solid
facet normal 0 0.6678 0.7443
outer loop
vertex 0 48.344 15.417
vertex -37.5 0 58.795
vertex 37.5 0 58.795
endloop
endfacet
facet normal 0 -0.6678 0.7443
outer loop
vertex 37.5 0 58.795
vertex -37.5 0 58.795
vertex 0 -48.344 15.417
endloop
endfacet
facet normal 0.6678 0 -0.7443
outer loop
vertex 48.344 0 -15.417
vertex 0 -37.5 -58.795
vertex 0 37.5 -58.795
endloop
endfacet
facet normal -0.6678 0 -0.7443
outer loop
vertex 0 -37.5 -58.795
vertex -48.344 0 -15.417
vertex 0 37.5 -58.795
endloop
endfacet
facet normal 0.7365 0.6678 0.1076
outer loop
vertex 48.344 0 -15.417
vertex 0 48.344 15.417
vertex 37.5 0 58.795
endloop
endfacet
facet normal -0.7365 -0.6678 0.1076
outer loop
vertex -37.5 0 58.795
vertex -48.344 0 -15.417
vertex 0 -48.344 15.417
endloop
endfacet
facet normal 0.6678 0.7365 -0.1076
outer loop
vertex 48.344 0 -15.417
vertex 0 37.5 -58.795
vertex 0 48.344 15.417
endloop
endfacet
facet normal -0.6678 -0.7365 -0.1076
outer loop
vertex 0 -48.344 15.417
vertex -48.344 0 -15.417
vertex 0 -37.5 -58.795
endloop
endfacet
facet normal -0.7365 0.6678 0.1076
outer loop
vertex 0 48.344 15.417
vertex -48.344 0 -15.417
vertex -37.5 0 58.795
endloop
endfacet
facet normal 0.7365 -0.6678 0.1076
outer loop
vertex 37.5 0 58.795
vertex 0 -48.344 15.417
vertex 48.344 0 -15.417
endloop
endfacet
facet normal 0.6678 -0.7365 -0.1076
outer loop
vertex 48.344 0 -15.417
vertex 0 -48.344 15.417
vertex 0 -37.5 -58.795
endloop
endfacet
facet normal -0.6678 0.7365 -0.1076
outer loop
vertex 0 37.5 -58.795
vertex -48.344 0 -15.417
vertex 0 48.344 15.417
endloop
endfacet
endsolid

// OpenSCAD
// file: numbers.scad
// The number we all love.
gold = (1 + sqrt(5)) / 2;

// Ratio of inner over outer circumscribed radii of the icosahedron.  The
// dodecahedron has the same ratio!
inscribe = sqrt(1/3 + 2/15 * sqrt(5));
// Ratio of face radius to icosahedron radius.
coscribe = sqrt(2/3 - 2/15 * sqrt(5));
// Ratio of dodecahedral mid-edge to vertex radii.  (This is the cosine of half
// the dihedral angle).
dodeca_midscribe = sqrt(1/2 + sqrt(5) / 6);
dodeca_comidscribe = sqrt(1/2 - sqrt(5) / 6);
// Ratio of icosahedral mid-edge to vertex radii.  (This is the cosine of half
// the dihedral angle).
icosa_midscribe = sqrt(1/2 + sqrt(5) / 10);
icosa_comidscribe = sqrt(1/2 - sqrt(5) / 10);

// Relative radii of the icosohedral stellation points.
raw_radius1 = 1;
raw_radius2 = (6 * gold - 3) / 5 * inscribe; // 1.0661408512011674
raw_radius3 = gold * icosa_midscribe;        // 1.3763819204711734
raw_radius4 = sqrt((17 - 4 * gold) / 5);     // 1.451059202444919
raw_radius5 = sqrt(21 + 28 * gold) / 5;      // 1.6285570507046667
raw_radius6 = 3 * inscribe;                  // 2.3839634168752983
raw_radius7 = 1 + 2 * gold;                  // 4.23607
raw_radius8 = sqrt(97 / 5 + 156 / 5 * gold); // 8.359584944780256
assert(abs(raw_radius5 - 1.6285570507046667) < 1e-7);
assert(abs(raw_radius8 - 8.359584944780256) < 1e-7);

// Radius of icosahedron with the vertex definitions we use.
ico_scale = sqrt(2 + gold);
// Actual radii in openscad units of the icosahedral stellation points.
radius1 = ico_scale;
radius2 = raw_radius2 * ico_scale;
radius3 = raw_radius3 * ico_scale;
radius4 = raw_radius4 * ico_scale;
radius5 = raw_radius5 * ico_scale;
radius6 = raw_radius6 * ico_scale;
radius7 = raw_radius7 * ico_scale;
radius8 = raw_radius8 * ico_scale;

identity = [[1,0,0],[0,1,0],[0,0,1]];

// Clockwise around [1,0,gold].
rot5 = [[1/2, gold/2, 1/2/gold],
        [-gold/2, 1/2/gold, 1/2],
        [1/2/gold, -1/2, gold/2]];

rot5_2 = rot5 * rot5;
rot5_3 = rot5_2 * rot5;
rot5_4 = rot5_2 * rot5_2;

rotate5 = [identity, rot5, rot5_2, rot5_3, rot5_4];
// file: stand.scad
// STANDS

// Create a tripod.  This implies that the object is face-up to get the 3-fold
// symmetry about the z-axis.
//
// `strut` is the distance from the z-axis to the support struts, as a fraction
// of radius.  `strut_mm` is the same in mm.  If both are non-zero then they
// are added together.
//
// `length` is the length of the strut, as fraction of radius.  Note that as
// the object is raised 2mm, we also increase the length by 2mm.
//
// `thick` is the radius of the struts.
//
// `base` is the base radius, if larger than the computed one.
//
// `hole` if non-zero is the radius of a circle to remove from the center of the
// base.
//
// `height` is the height of the center of the object, as a ratio of `radius`.
// 2mm is added to this.
module stand_tripod(strut, strut_mm=0, base=0,
                    length=1, height=1, align=[1, 0, 0], hole=0, p=10) {
    stand_generic(
        3, strut, strut_mm, base, length, height, hole, p)
        align_rot(align) faceup() children();
}

module stand_pentapod(strut, strut_mm=0, base=0,
                      length=1, height=1, hole=0, p=10) {
    stand_generic(
        5, strut, strut_mm, base, length, height, hole, p)
        pointup() children();
}

module stand_generic(num, strut, strut_mm=0, base=0,
                     length=1, height=1, hole=0, p=10) {
    if ($piece == p) {
        strut_all = strut * $radius + strut_mm;
        difference() {
            for (i = [1:num]) {
                rotate(i * 360 / num) translate([strut_all, 0, 0])
                    cylinder(r = $stand_diameter / 2, h=$radius * length + 2);
            }
            # translate([0, 0, $radius * height + 2])
                scale($radius) children();
        }
        stand_ring(base, hole, strut_all);
    }
}

module stand_quad(x, y, length=1, height=1, hole=0, knob=false) {
    difference() {
        for (c = [[x, y], [-x, y], [-x, -y], [x, -y]]) {
            translate([c.x * $radius, c.y * $radius, 0])
                cylinder(r = $stand_diameter / 2, h=$radius * length + 2);
        }
        #translate([0, 0, $radius * height + 2])
        scale($radius) children();
    }
    stand_ring(0, 1, norm([x, y]) * $radius);
}

module stand_rhombus(x, y, length=1, height=1) {
    difference() {
        for (c = [[x, 0], [-x, 0], [0, -y], [0, y]])
            translate([c.x * $radius, c.y * $radius, 0])
                cylinder(r = $stand_diameter / 2, h=$radius * length + 2);
        #translate([0, 0, $radius * height + 2])
        scale($radius) children();
    }
    stand_ring(max(x, y), min(x, y), x * $radius);
}

module stand_ring(base, hole, strut_mm) {
    outer = max(base * $radius, abs(strut_mm)) + $stand_diameter / 2;
    inner = min(hole * $radius, abs(strut_mm)) - $stand_diameter / 2;
    rounded_ring(outer, inner, n = $fn * 6);
}

module rounded_ring(outer, inner, height=0, r=2, n=0) {
    rotate_extrude($fn = n ? n : $fn) {
        translate([outer, height]) intersection() {
            circle(r);
            square(r);
        }
        if (inner >= r) translate([inner, height]) intersection() {
                circle(r);
                translate([-r, 0]) square(r);
            }
        if (outer > inner)
            translate([inner, 0]) square([outer - inner, height + r]);
        iinner = inner >= r ? inner - r : inner;
        if (height > 0)
            translate([inner, 0]) square([outer + r - iinner, height]);
    }
}
// main file
use <functions.scad>
use <splitting.scad>
use <stand.scad>

// Number of the Johnson solid.
deltahedron = 84;

// Piece to generate, 1 for main object, 2 onwards for faces, 10 for stand.
$piece = 1;

// Edge length.
$radius = 75;

// Diameter of the joiner post holes.
$join_diameter = 2.1;
// Depth of the joiner post holes.
$join_depth = 5.001;

$fn=20;

if (deltahedron == 12)
    triangular_bipyramid();

if (deltahedron == 13)
    pentagonal_bipyramid();

if (deltahedron == 17)
    gyroelongated_square_bipyramid();

if (deltahedron == 51)
    triaugmented_triangular_prism();

if (deltahedron == 84)
    snub_disphenoid();

module triangular_bipyramid() {
    id = [[1, 0, 0], [0, 1, 0], [0, 0, 1]];
    rot3 = [[-1/2, -sqrt(3)/2, 0], [sqrt(3)/2, -1/2, 0], [0, 0, 1]];
    rot3_2 = transpose(rot3.x, rot3.y, rot3.z);
    johnson_bipyramid([id, rot3, rot3_2]);
}

module pentagonal_bipyramid() {
    c72 = -(1 - sqrt(5)) / 4;
    s72 = sqrt((5 + sqrt(5)) / 8);
    c144 = -(1 + sqrt(5)) / 4;
    s144 = sqrt((5 - sqrt(5)) / 8);
    johnson_bipyramid(
        [[[1,0,0], [0,1,0], [0,0,1]],
         [[c72, -s72, 0], [s72, c72, 0], [0, 0, 1]],
         [[c144, -s144, 0], [s144, c144, 0], [0, 0, 1]],
         [[c144, s144, 0], [-s144, c144, 0], [0, 0, 1]],
         [[c72, s72, 0], [-s72, c72, 0], [0, 0, 1]]]);
}

module johnson_bipyramid(matrices) {
    n = len(matrices);
    p = matrices[0] * [1, 0, 0];
    q = matrices[1] * [1, 0, 0];
    il = norm(p - q);
    r = [$radius / il, 0, 0];
    h = $radius * sqrt(1 - 1 / (il * il));
    module half() {
        polyhedron(
            [[0, 0, h], for (m = matrices) m * r],
            [[each [1:n]], for (i = [1:n]) [0, i%n + 1, i]]);
    }
    if ($piece == 1) {
        color("lightgrey") half();
        color("grey") multmatrix([[1, 0, 0], [0, -1, 0], [0, 0, -1]]) half();
    }
    if ($piece == 2) {
        ir = [14 * r.x / h, 0, 0];
        difference() {
            half();
            for (m = matrices) translate(m * (r - ir)) joiner_post();
        }
    }
    if ($piece == 10) {
        fn = 40;
        o_rad=$radius/4;
        i_rad=4;
        // Centre of the supporting arcs.
        arc_c = [i_rad + o_rad, 0, o_rad];
        // End of arc.
        arc_e = arc_c + o_rad/2 * [-1, 0, sqrt(3)];
        // This is the point we want an edge to go through...
        pp = arc_c + [-o_rad * h, 0, o_rad * r.x] / norm([h, r.x]);
        // Translate back to centerline...
        qq = [0, 0, pp.z - h / r.x * pp.x];
        // Length of bridge at top.
        bridge = 5;
        difference() {
            intersection () {
                for (m = matrices)
                    multmatrix(m) {
                        translate(arc_c) {
                            rotate([90, 0, 0])
                                rotate_extrude(/*angle=150,*/ $fn = fn * 4)
                                translate([o_rad, 0])
                                circle(i_rad, $fn = fn);
                            //translate([i_rad+o_rad, 0, 0]) sphere(i_rad, $fn = fn);
                            //translate(arc_e) sphere(i_rad, $fn = fn);
                            translate([0, 0, sqrt(o_rad * o_rad - bridge * bridge/4)])
                                rotate([0, 90, 0])
                                cylinder(h=bridge, r=i_rad, center=true, $fn=fn);
                        }
                    }
                translate([0, 0, $radius]) cube($radius*2, center=true);
            }
            cylinder(r=2, h=$radius, $fn=n);
            translate(qq + [0, 0, h])
                multmatrix([[1, 0, 0], [0, -1, 0], [0, 0, -1]]) half();
        }
        rounded_ring(outer=o_rad+i_rad, inner=o_rad*0.75, n=fn*4);
    }
}

module gyroelongated_square_bipyramid() {
    // One square has vertices at [0.5,0.5,0] & 90° rotations, the other at
    // 45° rotations of that.
    //
    // We want the height to give a lenth of one between those...
    // h² + ½² + (½ - sqrt(½))² = 1.
    // h² + ¼ + ¼ + ½ - sqrt(½) = 1
    // h = sqrt(sqrt(½))
    h_by_2 = $radius * 0.5 * sqrt(sqrt(0.5));
    // The pyramid height has:
    // v² + ½ = 1,
    // v = sqrt(½).
    top_z = h_by_2 + $radius * sqrt(0.5);
    top = [0, 0, top_z];
    upper = [$radius / 2, $radius / 2, h_by_2];
    lower = [0, $radius * sqrt(0.5), -h_by_2];
    bot = [0, 0, -top_z];
    rot90 = [[0, -1, 0], [1, 0, 0], [0, 0, 1]];

    main();

    if ($piece == 9)
        posts();

    if ($piece == 10)
        stand();

    module main($piece = $piece) {
        part(top, rot90 * upper, upper, "gold", 2);
        part(upper, rot90 * upper, lower, "magenta", 3);
    }

    module part(u, v, w, topcolor, p) {
        if ($piece == 1)
            zeight() pyramid([u, v, w], topcolor=topcolor);
        if ($piece == p)
            delta_unpost(u, v, w, topcolor) posts();
    }

    module zfour() {
        children();
        multmatrix(rot90) children();
        multmatrix(rot90*rot90) children();
        multmatrix(rot90*rot90*rot90) children();
    }
    module rotmir() {
        children();
        sqh = sqrt(0.5);
        multmatrix([[sqh, sqh, 0], [sqh, -sqh, 0], [0, 0, -1]]) children();
    }
    module zeight() rotmir() zfour() children();

    module posts() {
        zeight() {
            edge_joiner_post(top, upper, 14.5, -5.5);
            edge_joiner_post(top, upper, -10, -5.5);

            color("red") edge_joiner_post(rot90*upper, upper, 10, -4.5);
            color("blue") edge_joiner_post(rot90*upper, upper, -12, -7.7);

            color("green") edge_joiner_post(upper, lower, 10, -4.5);
            color("orange") edge_joiner_post(rot90*upper, lower, 10, -7.7);
        }
    }

    module stand() {
        //$fn = 5;
        sradius = $radius / 2;
        sheight = sradius * sqrt(0.75);
        mradius = 5; // $radius / 10;

        // Each post has radius sradius and meets a 45° edge, so it is
        // centered at sqrt(2) * sradius.
        origin = sqrt(2) * sradius;
        difference() {
            for (angle = [-90, 0, 90, 180]) {
                rotate(angle) {
                    translate([-origin, 0, 2]) {
                        rotate([90, 0, 0])
                            rotate_extrude(angle=60, $fn = $fn * 10)
                                translate([sradius, 0]) circle(mradius);
                        translate([sradius/2, 0, sheight])
                            sphere(mradius, $fn=$fn*4);
                    }
                    if (false)
                        rotate([90, 0, 0]) linear_extrude(height = 1, center=true)
                            polygon(
                                [
                                    [origin-sradius, 0],
                                    [origin-sradius+mradius, 0],
                                    [origin-sradius/2+mradius, sheight+2],
                                    [origin-sradius, sheight+2]],
                                [[0, 1, 2, 3]]);
                }
            }
            translate([0, 0, top_z + 2]) main($piece = 1);
        }
        intersection() {
            rotate_extrude($fn = $fn * 6) {
                hole = 6;
                translate([hole, 0]) circle(2);
                translate([$radius/2, 0]) circle(2);
                translate([hole, -2]) square([$radius/2 - hole, 4]);
            }
            translate([0, 0, 1]) cube([$radius*1.5, $radius*1.5, 2], center=true);
        }
    }
}

module triaugmented_triangular_prism() {
    rot3 = [[-0.5, sqrt(0.75), 0], [-sqrt(0.75), -0.5, 0], [0, 0, 1]];
    rot3_2 = transpose(rot3.x, rot3.y, rot3.z);
    rot2 = [[1, 0, 0], [0, -1, 0], [0, 0, -1]];

    p = [$radius/sqrt(3), 0, $radius/2];
    q = rot3 * p;
    r = rot3_2 * p;
    t = [-$radius * (sqrt(1/12) + sqrt(1/2)), 0, 0];
    assert(norm(p - q) > $radius * 0.99999);
    assert(norm(p - q) < $radius * 1.00001);
    assert(norm(r - q) > $radius * 0.99999);
    assert(norm(r - q) < $radius * 1.00001);
    assert(norm(t - q) > $radius * 0.99999);
    assert(norm(t - q) < $radius * 1.00001);

    main();

    module main() {
        part(p, q, r, "gold", 2);
        part(r, q, t, "lightblue", 3);
        part(q, [q.x, q.y, -q.z], t, "magenta", 4);
    }

    if ($piece == 1 || $piece == 9)
        posts();

    if ($piece == 10)
        stand();

    module part(u, v, w, topcolor, p) {
        if ($piece == 1 && p != 2)
            six() pyramid([u, v, w], topcolor=topcolor);

        if ($piece == 1 && p == 2)
            two() pyramid([u, v, w], topcolor=topcolor);

        if ($piece == p)
            delta_unpost(u, v, w, topcolor) posts();
    }

    module two() {
        children();
        multmatrix(rot2) children();
    }
    module three() {
        children();
        multmatrix(rot3) children();
        multmatrix(rot3_2) children();
    }
    module six() three() two() children();

    module posts() {
        six() {
            color("orange") edge_joiner_post(q, r, 14, -5);
            color("yellow") edge_joiner_post(q, r, -14, -5);

            color("red") edge_joiner_post(p, rot2 * p, 10, -4);

            color("green") edge_joiner_post(t, q, 14.5, -5.5);
            color("blue") edge_joiner_post(t, r, 14.5, -5.5);

            color("lightgreen") edge_joiner_post(t, q, -11.3, -5.5);
            color("lightblue") edge_joiner_post(t, r, -11.3, -5.5);
        }
    }

    module stand() {
        $fn = 60;
        h = 20;
        r = 5;
        rad = $radius / sqrt(3);
        rounded_ring(rad + r, rad - r, n = 100);
        difference() {
            for (i = [0, 120, -120]) {
                rotate(i) {
                    translate([rad, 0, 0]) cylinder(h=h, r=r);
                    translate([rad, 0, h]) sphere(r);
                }
            }
            translate([0, 0, h + $radius / 2]) { $piece = 1; main(); }
        }
    }
}

module snub_disphenoid() {
    // This object isn't a cow so arbitrary use $radius as the edge length.
    top = $radius * [0.5, 0, 0.7839309101528681];
    upper = $radius * [0, 0.6445842843416881, 0.20556156416389393];
    lower = [upper.y, upper.x, -upper.z];
    bot = [top.y, top.x, -top.z];

    m = [[-1, 0, 0], [0, 1, 0], [0, 0, 1]];

    part(top, rz(top), upper, "gold", 2);
    part(top, upper, lower, "lightblue", 3);
    part(m*top, m*lower, m*upper, "lightblue", 4);

    if ($piece == 9)
        posts();

    if ($piece == 10)
        stand();

    module part(u, v, w, topcolor, p) {
        if ($piece == 1)
            rotmirz() pyramid([u, v, w], topcolor=topcolor);
        if ($piece == p)
            delta_unpost(u, v, w, topcolor) posts();
    }

    module rotmirz() {
        children();
        rotate(180) children();
        rotate(90) rotate([180, 0, 0]) children();
        rotate(-90) rotate([180, 0, 0]) children();
    }

    module posts() {
        rotmirz() {
            color("green") post(top, rz(top), -10, -6);

            edge_joiner_post(top, upper, -8, -7);
            edge_joiner_post(top, upper, 12, -7);
            edge_joiner_post(rz(top), upper, -10, -8.68);
            edge_joiner_post(rz(top), upper, 12, -7);

            edge_joiner_post(top, lower, 16, -7);
            edge_joiner_post(top, lower, -8, -7);

            edge_joiner_post(upper, lower, -13, -7);
            edge_joiner_post(upper, lower, 13, -7);

            edge_joiner_post(upper, rz(lower), -13, -7);
            edge_joiner_post(upper, rz(lower), 13, -7);
        }
    }

    module stand() {
        $fn = 80;

        difference() {
            union() {
                arc(angle=45, big_R=$radius*0.6, little_r=$radius/10,
                    offset=$radius/10, rot=0);
                arc(angle=45, big_R=$radius*0.6, little_r=$radius/10,
                    offset=$radius/10, rot=180);

                arc(angle=55, big_R=$radius/5, little_r=$radius/10,
                    offset=$radius*0.2, rot=90);
                arc(angle=55, big_R=$radius/5, little_r=$radius/10,
                    offset=$radius*0.2, rot=-90);
            }

            #translate([0, 0, top.z+$radius*0.15]) main();
        }

        rotate_extrude() {
            square([$radius / 3, 2]);
            translate([$radius / 3, 0]) intersection() {
                circle(2);
                translate([-3,0]) square(6);
            }
        }

        module arc(angle, big_R, little_r, offset, rot=0) {
            rotate(rot) translate([-(big_R + offset), 0, 0]) rotate([90, 0, 0])
            {
                rotate(angle) translate([big_R, 0]) sphere(little_r);
                rotate_extrude(angle=angle)
                    translate([big_R, 0]) circle(little_r);
            }
        }
    }
}

module delta_unpost(u, v, w, topcolor) {
    c = (u + v + w) / 3;
    normal = unit(cross(v - u, w - u));
    intersection() {
        verticate(normal) translate(-c) difference() {
            pyramid([u, v, w], topcolor=topcolor);
            children();
        }
        cube([2 * $radius, 2 * $radius, 20], center=true);
    }
}
